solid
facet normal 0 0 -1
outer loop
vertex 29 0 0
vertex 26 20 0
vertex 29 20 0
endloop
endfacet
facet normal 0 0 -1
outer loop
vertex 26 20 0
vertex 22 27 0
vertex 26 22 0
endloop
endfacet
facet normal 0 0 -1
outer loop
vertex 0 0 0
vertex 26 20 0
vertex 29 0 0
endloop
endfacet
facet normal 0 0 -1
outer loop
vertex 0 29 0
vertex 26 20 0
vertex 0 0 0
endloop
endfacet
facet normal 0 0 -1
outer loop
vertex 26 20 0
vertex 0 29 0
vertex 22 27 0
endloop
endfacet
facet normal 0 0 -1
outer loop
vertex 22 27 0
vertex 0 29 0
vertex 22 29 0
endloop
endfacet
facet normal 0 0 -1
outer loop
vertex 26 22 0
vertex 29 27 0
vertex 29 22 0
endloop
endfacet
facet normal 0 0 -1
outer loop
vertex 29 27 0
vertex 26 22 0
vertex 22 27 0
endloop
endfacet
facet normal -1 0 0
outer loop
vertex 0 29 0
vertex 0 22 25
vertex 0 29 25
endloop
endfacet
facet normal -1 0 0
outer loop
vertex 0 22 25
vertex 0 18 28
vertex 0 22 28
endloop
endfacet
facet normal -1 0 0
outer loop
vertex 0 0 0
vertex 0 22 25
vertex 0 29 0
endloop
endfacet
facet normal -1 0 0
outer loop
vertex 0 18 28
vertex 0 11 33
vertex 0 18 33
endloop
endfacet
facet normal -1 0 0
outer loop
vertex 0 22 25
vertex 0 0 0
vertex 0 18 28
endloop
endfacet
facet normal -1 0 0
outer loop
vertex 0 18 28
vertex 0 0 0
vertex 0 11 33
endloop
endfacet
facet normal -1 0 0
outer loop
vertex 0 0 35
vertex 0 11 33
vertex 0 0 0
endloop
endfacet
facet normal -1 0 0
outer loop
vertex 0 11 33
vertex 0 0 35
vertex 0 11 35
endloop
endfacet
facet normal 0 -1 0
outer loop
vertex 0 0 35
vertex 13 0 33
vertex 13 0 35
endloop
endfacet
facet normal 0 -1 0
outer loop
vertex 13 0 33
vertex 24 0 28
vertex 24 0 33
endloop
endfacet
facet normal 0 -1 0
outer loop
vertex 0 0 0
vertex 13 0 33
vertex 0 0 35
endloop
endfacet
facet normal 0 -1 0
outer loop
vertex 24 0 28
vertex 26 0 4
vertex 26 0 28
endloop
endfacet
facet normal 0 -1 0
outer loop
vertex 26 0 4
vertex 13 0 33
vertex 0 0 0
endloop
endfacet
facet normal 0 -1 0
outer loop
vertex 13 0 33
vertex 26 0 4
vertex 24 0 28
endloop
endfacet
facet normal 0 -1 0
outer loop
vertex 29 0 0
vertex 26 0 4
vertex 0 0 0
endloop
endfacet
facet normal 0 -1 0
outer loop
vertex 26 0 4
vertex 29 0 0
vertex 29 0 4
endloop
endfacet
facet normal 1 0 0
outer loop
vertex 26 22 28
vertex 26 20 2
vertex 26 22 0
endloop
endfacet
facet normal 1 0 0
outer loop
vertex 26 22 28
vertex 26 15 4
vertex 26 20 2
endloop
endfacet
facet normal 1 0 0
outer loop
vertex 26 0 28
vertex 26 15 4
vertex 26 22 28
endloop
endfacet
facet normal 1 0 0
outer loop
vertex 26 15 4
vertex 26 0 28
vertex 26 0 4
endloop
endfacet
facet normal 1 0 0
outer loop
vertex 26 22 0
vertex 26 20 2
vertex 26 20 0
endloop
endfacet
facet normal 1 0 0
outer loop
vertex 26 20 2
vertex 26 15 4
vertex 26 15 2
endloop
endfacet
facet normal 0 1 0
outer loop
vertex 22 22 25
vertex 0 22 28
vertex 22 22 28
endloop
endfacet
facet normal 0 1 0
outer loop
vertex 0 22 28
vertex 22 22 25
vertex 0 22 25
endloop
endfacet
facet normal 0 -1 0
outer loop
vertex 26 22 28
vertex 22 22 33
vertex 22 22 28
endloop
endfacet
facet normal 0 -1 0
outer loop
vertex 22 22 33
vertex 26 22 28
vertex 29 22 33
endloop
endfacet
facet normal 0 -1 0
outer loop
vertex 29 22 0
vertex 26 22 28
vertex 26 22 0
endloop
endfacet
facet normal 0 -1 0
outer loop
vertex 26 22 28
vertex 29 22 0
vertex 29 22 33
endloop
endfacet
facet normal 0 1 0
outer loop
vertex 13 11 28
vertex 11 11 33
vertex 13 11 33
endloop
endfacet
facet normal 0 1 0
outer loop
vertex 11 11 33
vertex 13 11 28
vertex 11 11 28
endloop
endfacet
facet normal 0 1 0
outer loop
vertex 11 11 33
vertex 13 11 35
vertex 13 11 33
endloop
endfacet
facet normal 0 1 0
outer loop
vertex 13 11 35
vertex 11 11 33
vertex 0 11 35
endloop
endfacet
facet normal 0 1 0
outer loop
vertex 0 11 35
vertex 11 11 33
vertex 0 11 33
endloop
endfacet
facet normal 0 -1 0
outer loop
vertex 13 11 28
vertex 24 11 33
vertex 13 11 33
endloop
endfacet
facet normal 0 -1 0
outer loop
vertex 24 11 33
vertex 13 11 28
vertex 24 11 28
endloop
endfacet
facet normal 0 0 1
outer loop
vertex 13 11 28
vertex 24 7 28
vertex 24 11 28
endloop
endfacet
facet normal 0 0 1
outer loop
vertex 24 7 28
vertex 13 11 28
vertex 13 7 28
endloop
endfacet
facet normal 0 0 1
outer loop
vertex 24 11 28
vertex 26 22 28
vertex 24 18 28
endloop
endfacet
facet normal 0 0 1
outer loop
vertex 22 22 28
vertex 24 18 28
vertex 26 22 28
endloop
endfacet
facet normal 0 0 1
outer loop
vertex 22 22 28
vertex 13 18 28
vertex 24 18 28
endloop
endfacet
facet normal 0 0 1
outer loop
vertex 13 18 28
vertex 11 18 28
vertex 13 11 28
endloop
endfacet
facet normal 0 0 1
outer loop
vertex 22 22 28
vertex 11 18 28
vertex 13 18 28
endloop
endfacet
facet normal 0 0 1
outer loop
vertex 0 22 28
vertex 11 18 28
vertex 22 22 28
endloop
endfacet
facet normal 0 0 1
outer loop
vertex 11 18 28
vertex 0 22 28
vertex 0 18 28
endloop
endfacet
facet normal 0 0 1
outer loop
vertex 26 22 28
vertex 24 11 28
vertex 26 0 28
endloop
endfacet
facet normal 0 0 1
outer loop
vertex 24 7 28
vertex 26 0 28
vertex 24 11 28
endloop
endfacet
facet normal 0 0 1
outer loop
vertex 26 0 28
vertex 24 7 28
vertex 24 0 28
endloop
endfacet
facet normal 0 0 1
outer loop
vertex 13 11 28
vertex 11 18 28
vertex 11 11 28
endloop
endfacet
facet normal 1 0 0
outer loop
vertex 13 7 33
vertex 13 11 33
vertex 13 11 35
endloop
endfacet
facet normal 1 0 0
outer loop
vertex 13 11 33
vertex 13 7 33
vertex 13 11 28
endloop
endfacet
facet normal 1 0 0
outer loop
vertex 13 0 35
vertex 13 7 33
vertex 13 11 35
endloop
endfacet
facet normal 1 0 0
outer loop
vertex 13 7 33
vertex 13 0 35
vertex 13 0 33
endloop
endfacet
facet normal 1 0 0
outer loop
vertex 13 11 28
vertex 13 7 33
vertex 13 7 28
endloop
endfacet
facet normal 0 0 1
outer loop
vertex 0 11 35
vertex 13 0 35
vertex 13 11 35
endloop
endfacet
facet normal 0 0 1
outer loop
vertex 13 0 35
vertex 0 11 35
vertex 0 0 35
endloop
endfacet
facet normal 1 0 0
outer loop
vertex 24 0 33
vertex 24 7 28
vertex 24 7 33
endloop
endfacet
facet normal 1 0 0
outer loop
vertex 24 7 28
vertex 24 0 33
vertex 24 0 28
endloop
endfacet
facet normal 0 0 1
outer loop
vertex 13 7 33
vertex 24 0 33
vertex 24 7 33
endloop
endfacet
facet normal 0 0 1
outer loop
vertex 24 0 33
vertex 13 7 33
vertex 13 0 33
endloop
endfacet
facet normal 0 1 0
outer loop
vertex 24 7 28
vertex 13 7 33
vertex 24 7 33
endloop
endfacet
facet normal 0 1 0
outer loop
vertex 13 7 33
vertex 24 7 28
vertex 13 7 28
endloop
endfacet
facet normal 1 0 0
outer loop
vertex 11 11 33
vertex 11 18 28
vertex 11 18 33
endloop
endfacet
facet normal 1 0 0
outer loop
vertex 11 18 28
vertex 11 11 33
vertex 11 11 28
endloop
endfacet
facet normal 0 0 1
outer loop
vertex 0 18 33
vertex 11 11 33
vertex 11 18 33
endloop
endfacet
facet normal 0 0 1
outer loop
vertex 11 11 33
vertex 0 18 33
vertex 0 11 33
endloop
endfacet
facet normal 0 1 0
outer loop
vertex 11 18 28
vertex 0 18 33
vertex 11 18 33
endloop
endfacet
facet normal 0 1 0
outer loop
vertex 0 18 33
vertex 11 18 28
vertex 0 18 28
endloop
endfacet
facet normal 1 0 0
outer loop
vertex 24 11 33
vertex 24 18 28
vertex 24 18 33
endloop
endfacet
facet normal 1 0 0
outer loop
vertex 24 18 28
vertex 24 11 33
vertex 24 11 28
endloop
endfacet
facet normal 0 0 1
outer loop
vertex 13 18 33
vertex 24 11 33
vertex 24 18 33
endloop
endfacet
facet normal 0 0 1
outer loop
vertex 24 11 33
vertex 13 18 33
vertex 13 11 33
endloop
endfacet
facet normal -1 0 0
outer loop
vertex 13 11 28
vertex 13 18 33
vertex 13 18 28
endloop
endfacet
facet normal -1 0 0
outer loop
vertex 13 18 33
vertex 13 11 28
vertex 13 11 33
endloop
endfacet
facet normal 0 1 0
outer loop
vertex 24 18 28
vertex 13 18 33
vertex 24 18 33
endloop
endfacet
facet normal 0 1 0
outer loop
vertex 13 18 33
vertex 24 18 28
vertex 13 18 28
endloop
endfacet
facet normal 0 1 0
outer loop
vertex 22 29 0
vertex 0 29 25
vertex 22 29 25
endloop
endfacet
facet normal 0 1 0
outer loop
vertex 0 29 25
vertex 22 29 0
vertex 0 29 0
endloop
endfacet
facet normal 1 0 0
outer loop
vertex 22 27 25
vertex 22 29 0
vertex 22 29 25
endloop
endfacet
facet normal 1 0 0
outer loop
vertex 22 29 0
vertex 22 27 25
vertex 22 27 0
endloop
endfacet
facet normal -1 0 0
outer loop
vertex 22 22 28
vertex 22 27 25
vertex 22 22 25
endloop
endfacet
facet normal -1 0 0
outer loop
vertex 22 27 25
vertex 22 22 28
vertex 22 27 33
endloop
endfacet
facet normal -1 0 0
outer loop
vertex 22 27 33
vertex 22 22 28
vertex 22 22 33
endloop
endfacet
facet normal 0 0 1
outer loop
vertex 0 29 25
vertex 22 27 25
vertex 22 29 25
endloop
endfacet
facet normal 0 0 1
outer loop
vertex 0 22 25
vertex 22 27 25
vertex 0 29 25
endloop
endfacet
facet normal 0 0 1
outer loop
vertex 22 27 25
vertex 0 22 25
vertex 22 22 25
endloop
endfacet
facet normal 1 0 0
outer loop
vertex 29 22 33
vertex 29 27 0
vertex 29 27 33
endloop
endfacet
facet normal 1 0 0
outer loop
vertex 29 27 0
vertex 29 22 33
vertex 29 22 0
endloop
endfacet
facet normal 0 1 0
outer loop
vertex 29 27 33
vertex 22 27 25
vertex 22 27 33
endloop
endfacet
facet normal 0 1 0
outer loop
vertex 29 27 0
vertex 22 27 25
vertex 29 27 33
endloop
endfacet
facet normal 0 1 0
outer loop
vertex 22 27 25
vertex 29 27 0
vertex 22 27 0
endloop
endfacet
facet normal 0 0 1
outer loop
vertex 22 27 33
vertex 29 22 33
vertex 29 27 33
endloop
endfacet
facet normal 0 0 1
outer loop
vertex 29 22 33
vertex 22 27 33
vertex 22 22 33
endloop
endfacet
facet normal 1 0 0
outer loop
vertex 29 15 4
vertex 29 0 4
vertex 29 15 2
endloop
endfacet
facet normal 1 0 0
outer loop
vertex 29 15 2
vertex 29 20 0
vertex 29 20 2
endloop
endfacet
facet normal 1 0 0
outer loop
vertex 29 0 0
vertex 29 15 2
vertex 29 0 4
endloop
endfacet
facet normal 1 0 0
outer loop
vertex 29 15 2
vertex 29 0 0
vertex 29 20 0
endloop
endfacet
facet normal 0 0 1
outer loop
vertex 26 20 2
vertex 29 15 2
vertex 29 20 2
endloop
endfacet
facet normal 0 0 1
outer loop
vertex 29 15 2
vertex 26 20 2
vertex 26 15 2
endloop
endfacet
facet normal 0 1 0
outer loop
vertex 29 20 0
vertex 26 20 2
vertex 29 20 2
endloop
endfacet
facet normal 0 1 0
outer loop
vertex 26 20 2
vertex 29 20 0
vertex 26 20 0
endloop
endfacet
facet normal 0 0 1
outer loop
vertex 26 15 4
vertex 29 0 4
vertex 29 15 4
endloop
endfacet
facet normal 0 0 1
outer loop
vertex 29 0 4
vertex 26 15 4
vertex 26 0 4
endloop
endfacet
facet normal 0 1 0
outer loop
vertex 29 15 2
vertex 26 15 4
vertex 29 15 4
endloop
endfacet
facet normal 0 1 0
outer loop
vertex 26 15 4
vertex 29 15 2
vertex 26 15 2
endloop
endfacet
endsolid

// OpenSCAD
translate([6.5, 5.5, 3.5]) color([0.8064669735456029, 0.16884400503942165, 0.7876813921208954]) cube([13, 11, 7], center=true);
translate([19.5, 5.5, 3.5]) color([0.6836592298851071, 0.1683147603108942, 0.0784886436699127]) cube([13, 11, 7], center=true);
translate([6.5, 16.5, 3.5]) color([0.9276494299222889, 0.5978783972833935, 0.620510173056511]) cube([13, 11, 7], center=true);
translate([19.5, 16.5, 3.5]) color([0.4575118028380537, 0.15007097732228858, 0.6019699129465877]) cube([13, 11, 7], center=true);
translate([6.5, 5.5, 10.5]) color([0.2524728800375037, 0.8058946560175415, 0.732718954805416]) cube([13, 11, 7], center=true);
translate([19.5, 5.5, 10.5]) color([0.027267185045511733, 0.9324230096450348, 0.03631604832667812]) cube([13, 11, 7], center=true);
translate([6.5, 16.5, 10.5]) color([0.0896193188307074, 0.2927345609042453, 0.1508090604701401]) cube([13, 11, 7], center=true);
translate([19.5, 16.5, 10.5]) color([0.2361450829166024, 0.3558094886115547, 0.7354997154547138]) cube([13, 11, 7], center=true);
translate([6.5, 5.5, 17.5]) color([0.4047113607648444, 0.2698397547254259, 0.4923131536276696]) cube([13, 11, 7], center=true);
translate([19.5, 5.5, 17.5]) color([0.39259324978876053, 0.310764197486207, 0.900541657866744]) cube([13, 11, 7], center=true);
translate([6.5, 16.5, 17.5]) color([0.5504484509596044, 0.9773275109747672, 0.7729124093934382]) cube([13, 11, 7], center=true);
translate([19.5, 16.5, 17.5]) color([0.570499297619577, 0.26244658927686404, 0.6868436562888387]) cube([13, 11, 7], center=true);
translate([6.5, 5.5, 24.5]) color([0.45591771896977173, 0.7213877150417534, 0.40377880891106155]) cube([13, 11, 7], center=true);
translate([19.5, 5.5, 24.5]) color([0.49600503631794757, 0.02068376744575562, 0.739958502320053]) cube([13, 11, 7], center=true);
translate([6.5, 16.5, 24.5]) color([0.03427354435563068, 0.6807253858476396, 0.5820036955379622]) cube([13, 11, 7], center=true);
translate([19.5, 16.5, 24.5]) color([0.7759176114881267, 0.28977759923741564, 0.6861108151233298]) cube([13, 11, 7], center=true);
translate([6.5, 5.5, 31.5]) color([0.20709797563103816, 0.5292720013578311, 0.34028037925118015]) cube([13, 11, 7], center=true);
translate([18.5, 3.5, 30.5]) color([0.9784545513570129, 0.9718665573793185, 0.20896973547336006]) cube([11, 7, 5], center=true);
translate([5.5, 14.5, 30.5]) color([0.5660382358858294, 0.3294426858782725, 0.9685381870202809]) cube([11, 7, 5], center=true);
translate([18.5, 14.5, 30.5]) color([0.9245259481865659, 0.5861458530564896, 0.7200844551084937]) cube([11, 7, 5], center=true);
translate([5.5, 25.5, 2.5]) color([0.6813247567090696, 0.353355632443361, 0.91636156937516]) cube([11, 7, 5], center=true);
translate([16.5, 25.5, 2.5]) color([0.899453536816357, 0.33065846447807934, 0.7473949106043586]) cube([11, 7, 5], center=true);
translate([5.5, 25.5, 7.5]) color([0.009092126674448586, 0.8163591105584419, 0.5648693453979996]) cube([11, 7, 5], center=true);
translate([16.5, 25.5, 7.5]) color([0.9523067127509502, 0.3631930745481745, 0.6257130749033707]) cube([11, 7, 5], center=true);
translate([5.5, 25.5, 12.5]) color([0.3230024315033787, 0.7827853814039997, 0.6007029967830003]) cube([11, 7, 5], center=true);
translate([16.5, 25.5, 12.5]) color([0.9874710229786893, 0.0010127930964535237, 0.14075874215813544]) cube([11, 7, 5], center=true);
translate([5.5, 25.5, 17.5]) color([0.043601382090813434, 0.1258478488128345, 0.9293852970698306]) cube([11, 7, 5], center=true);
translate([16.5, 25.5, 17.5]) color([0.9486082995058949, 0.4804125346981437, 0.9466893945947962]) cube([11, 7, 5], center=true);
translate([5.5, 25.5, 22.5]) color([0.818387610188399, 0.7786177341461099, 0.747281950803196]) cube([11, 7, 5], center=true);
translate([16.5, 25.5, 22.5]) color([0.18765458516959888, 0.5488772611027803, 0.4238792306088448]) cube([11, 7, 5], center=true);
translate([25.5, 24.5, 1.5]) color([0.949788047597888, 0.17383353806681645, 0.16985884355967462]) cube([7, 5, 3], center=true);
translate([25.5, 24.5, 4.5]) color([0.6588617536380149, 0.15740178957348283, 0.11005367295186075]) cube([7, 5, 3], center=true);
translate([25.5, 24.5, 7.5]) color([0.5039231973300066, 0.796660971220008, 0.6050456716470326]) cube([7, 5, 3], center=true);
translate([25.5, 24.5, 10.5]) color([0.7547539728480395, 0.2657585316255522, 0.28496283302929337]) cube([7, 5, 3], center=true);
translate([25.5, 24.5, 13.5]) color([0.42870364173152453, 0.990847884265713, 0.7179182565245089]) cube([7, 5, 3], center=true);
translate([25.5, 24.5, 16.5]) color([0.9462539572878983, 0.537870455736408, 0.5545598515713968]) cube([7, 5, 3], center=true);
translate([25.5, 24.5, 19.5]) color([0.9900903354753839, 0.18998827565888077, 0.7825904371715813]) cube([7, 5, 3], center=true);
translate([25.5, 24.5, 22.5]) color([0.7915138240285756, 0.8447416276181308, 0.7500527092169327]) cube([7, 5, 3], center=true);
translate([25.5, 24.5, 25.5]) color([0.15533301818854706, 0.661127632121674, 0.9237031845862264]) cube([7, 5, 3], center=true);
translate([25.5, 24.5, 28.5]) color([0.5632851524959844, 0.3609415103802872, 0.9495201486078587]) cube([7, 5, 3], center=true);
translate([25.5, 24.5, 31.5]) color([0.5615986504586717, 0.41163639453549183, 0.6141334980612769]) cube([7, 5, 3], center=true);
translate([27.5, 2.5, 1.0]) color([0.8041250166314531, 0.22830209061365048, 0.01569204302297844]) cube([3, 5, 2], center=true);
translate([27.5, 7.5, 1.0]) color([0.5290948970731422, 0.9413574200758085, 0.6802579626031922]) cube([3, 5, 2], center=true);
translate([27.5, 12.5, 1.0]) color([0.6309080001300065, 0.6278151474899732, 0.4969897122617175]) cube([3, 5, 2], center=true);
translate([27.5, 17.5, 1.0]) color([0.7309192697350546, 0.2491944400337247, 0.891754263952968]) cube([3, 5, 2], center=true);
translate([27.5, 2.5, 3.0]) color([0.2744726552452267, 0.9449450132107339, 0.9264967100320902]) cube([3, 5, 2], center=true);
translate([27.5, 7.5, 3.0]) color([0.07792452404752792, 0.44817970124433604, 0.7440362849370825]) cube([3, 5, 2], center=true);
translate([27.5, 12.5, 3.0]) color([0.44965407150807035, 0.5088990248364155, 0.8068239376717178]) cube([3, 5, 2], center=true);
